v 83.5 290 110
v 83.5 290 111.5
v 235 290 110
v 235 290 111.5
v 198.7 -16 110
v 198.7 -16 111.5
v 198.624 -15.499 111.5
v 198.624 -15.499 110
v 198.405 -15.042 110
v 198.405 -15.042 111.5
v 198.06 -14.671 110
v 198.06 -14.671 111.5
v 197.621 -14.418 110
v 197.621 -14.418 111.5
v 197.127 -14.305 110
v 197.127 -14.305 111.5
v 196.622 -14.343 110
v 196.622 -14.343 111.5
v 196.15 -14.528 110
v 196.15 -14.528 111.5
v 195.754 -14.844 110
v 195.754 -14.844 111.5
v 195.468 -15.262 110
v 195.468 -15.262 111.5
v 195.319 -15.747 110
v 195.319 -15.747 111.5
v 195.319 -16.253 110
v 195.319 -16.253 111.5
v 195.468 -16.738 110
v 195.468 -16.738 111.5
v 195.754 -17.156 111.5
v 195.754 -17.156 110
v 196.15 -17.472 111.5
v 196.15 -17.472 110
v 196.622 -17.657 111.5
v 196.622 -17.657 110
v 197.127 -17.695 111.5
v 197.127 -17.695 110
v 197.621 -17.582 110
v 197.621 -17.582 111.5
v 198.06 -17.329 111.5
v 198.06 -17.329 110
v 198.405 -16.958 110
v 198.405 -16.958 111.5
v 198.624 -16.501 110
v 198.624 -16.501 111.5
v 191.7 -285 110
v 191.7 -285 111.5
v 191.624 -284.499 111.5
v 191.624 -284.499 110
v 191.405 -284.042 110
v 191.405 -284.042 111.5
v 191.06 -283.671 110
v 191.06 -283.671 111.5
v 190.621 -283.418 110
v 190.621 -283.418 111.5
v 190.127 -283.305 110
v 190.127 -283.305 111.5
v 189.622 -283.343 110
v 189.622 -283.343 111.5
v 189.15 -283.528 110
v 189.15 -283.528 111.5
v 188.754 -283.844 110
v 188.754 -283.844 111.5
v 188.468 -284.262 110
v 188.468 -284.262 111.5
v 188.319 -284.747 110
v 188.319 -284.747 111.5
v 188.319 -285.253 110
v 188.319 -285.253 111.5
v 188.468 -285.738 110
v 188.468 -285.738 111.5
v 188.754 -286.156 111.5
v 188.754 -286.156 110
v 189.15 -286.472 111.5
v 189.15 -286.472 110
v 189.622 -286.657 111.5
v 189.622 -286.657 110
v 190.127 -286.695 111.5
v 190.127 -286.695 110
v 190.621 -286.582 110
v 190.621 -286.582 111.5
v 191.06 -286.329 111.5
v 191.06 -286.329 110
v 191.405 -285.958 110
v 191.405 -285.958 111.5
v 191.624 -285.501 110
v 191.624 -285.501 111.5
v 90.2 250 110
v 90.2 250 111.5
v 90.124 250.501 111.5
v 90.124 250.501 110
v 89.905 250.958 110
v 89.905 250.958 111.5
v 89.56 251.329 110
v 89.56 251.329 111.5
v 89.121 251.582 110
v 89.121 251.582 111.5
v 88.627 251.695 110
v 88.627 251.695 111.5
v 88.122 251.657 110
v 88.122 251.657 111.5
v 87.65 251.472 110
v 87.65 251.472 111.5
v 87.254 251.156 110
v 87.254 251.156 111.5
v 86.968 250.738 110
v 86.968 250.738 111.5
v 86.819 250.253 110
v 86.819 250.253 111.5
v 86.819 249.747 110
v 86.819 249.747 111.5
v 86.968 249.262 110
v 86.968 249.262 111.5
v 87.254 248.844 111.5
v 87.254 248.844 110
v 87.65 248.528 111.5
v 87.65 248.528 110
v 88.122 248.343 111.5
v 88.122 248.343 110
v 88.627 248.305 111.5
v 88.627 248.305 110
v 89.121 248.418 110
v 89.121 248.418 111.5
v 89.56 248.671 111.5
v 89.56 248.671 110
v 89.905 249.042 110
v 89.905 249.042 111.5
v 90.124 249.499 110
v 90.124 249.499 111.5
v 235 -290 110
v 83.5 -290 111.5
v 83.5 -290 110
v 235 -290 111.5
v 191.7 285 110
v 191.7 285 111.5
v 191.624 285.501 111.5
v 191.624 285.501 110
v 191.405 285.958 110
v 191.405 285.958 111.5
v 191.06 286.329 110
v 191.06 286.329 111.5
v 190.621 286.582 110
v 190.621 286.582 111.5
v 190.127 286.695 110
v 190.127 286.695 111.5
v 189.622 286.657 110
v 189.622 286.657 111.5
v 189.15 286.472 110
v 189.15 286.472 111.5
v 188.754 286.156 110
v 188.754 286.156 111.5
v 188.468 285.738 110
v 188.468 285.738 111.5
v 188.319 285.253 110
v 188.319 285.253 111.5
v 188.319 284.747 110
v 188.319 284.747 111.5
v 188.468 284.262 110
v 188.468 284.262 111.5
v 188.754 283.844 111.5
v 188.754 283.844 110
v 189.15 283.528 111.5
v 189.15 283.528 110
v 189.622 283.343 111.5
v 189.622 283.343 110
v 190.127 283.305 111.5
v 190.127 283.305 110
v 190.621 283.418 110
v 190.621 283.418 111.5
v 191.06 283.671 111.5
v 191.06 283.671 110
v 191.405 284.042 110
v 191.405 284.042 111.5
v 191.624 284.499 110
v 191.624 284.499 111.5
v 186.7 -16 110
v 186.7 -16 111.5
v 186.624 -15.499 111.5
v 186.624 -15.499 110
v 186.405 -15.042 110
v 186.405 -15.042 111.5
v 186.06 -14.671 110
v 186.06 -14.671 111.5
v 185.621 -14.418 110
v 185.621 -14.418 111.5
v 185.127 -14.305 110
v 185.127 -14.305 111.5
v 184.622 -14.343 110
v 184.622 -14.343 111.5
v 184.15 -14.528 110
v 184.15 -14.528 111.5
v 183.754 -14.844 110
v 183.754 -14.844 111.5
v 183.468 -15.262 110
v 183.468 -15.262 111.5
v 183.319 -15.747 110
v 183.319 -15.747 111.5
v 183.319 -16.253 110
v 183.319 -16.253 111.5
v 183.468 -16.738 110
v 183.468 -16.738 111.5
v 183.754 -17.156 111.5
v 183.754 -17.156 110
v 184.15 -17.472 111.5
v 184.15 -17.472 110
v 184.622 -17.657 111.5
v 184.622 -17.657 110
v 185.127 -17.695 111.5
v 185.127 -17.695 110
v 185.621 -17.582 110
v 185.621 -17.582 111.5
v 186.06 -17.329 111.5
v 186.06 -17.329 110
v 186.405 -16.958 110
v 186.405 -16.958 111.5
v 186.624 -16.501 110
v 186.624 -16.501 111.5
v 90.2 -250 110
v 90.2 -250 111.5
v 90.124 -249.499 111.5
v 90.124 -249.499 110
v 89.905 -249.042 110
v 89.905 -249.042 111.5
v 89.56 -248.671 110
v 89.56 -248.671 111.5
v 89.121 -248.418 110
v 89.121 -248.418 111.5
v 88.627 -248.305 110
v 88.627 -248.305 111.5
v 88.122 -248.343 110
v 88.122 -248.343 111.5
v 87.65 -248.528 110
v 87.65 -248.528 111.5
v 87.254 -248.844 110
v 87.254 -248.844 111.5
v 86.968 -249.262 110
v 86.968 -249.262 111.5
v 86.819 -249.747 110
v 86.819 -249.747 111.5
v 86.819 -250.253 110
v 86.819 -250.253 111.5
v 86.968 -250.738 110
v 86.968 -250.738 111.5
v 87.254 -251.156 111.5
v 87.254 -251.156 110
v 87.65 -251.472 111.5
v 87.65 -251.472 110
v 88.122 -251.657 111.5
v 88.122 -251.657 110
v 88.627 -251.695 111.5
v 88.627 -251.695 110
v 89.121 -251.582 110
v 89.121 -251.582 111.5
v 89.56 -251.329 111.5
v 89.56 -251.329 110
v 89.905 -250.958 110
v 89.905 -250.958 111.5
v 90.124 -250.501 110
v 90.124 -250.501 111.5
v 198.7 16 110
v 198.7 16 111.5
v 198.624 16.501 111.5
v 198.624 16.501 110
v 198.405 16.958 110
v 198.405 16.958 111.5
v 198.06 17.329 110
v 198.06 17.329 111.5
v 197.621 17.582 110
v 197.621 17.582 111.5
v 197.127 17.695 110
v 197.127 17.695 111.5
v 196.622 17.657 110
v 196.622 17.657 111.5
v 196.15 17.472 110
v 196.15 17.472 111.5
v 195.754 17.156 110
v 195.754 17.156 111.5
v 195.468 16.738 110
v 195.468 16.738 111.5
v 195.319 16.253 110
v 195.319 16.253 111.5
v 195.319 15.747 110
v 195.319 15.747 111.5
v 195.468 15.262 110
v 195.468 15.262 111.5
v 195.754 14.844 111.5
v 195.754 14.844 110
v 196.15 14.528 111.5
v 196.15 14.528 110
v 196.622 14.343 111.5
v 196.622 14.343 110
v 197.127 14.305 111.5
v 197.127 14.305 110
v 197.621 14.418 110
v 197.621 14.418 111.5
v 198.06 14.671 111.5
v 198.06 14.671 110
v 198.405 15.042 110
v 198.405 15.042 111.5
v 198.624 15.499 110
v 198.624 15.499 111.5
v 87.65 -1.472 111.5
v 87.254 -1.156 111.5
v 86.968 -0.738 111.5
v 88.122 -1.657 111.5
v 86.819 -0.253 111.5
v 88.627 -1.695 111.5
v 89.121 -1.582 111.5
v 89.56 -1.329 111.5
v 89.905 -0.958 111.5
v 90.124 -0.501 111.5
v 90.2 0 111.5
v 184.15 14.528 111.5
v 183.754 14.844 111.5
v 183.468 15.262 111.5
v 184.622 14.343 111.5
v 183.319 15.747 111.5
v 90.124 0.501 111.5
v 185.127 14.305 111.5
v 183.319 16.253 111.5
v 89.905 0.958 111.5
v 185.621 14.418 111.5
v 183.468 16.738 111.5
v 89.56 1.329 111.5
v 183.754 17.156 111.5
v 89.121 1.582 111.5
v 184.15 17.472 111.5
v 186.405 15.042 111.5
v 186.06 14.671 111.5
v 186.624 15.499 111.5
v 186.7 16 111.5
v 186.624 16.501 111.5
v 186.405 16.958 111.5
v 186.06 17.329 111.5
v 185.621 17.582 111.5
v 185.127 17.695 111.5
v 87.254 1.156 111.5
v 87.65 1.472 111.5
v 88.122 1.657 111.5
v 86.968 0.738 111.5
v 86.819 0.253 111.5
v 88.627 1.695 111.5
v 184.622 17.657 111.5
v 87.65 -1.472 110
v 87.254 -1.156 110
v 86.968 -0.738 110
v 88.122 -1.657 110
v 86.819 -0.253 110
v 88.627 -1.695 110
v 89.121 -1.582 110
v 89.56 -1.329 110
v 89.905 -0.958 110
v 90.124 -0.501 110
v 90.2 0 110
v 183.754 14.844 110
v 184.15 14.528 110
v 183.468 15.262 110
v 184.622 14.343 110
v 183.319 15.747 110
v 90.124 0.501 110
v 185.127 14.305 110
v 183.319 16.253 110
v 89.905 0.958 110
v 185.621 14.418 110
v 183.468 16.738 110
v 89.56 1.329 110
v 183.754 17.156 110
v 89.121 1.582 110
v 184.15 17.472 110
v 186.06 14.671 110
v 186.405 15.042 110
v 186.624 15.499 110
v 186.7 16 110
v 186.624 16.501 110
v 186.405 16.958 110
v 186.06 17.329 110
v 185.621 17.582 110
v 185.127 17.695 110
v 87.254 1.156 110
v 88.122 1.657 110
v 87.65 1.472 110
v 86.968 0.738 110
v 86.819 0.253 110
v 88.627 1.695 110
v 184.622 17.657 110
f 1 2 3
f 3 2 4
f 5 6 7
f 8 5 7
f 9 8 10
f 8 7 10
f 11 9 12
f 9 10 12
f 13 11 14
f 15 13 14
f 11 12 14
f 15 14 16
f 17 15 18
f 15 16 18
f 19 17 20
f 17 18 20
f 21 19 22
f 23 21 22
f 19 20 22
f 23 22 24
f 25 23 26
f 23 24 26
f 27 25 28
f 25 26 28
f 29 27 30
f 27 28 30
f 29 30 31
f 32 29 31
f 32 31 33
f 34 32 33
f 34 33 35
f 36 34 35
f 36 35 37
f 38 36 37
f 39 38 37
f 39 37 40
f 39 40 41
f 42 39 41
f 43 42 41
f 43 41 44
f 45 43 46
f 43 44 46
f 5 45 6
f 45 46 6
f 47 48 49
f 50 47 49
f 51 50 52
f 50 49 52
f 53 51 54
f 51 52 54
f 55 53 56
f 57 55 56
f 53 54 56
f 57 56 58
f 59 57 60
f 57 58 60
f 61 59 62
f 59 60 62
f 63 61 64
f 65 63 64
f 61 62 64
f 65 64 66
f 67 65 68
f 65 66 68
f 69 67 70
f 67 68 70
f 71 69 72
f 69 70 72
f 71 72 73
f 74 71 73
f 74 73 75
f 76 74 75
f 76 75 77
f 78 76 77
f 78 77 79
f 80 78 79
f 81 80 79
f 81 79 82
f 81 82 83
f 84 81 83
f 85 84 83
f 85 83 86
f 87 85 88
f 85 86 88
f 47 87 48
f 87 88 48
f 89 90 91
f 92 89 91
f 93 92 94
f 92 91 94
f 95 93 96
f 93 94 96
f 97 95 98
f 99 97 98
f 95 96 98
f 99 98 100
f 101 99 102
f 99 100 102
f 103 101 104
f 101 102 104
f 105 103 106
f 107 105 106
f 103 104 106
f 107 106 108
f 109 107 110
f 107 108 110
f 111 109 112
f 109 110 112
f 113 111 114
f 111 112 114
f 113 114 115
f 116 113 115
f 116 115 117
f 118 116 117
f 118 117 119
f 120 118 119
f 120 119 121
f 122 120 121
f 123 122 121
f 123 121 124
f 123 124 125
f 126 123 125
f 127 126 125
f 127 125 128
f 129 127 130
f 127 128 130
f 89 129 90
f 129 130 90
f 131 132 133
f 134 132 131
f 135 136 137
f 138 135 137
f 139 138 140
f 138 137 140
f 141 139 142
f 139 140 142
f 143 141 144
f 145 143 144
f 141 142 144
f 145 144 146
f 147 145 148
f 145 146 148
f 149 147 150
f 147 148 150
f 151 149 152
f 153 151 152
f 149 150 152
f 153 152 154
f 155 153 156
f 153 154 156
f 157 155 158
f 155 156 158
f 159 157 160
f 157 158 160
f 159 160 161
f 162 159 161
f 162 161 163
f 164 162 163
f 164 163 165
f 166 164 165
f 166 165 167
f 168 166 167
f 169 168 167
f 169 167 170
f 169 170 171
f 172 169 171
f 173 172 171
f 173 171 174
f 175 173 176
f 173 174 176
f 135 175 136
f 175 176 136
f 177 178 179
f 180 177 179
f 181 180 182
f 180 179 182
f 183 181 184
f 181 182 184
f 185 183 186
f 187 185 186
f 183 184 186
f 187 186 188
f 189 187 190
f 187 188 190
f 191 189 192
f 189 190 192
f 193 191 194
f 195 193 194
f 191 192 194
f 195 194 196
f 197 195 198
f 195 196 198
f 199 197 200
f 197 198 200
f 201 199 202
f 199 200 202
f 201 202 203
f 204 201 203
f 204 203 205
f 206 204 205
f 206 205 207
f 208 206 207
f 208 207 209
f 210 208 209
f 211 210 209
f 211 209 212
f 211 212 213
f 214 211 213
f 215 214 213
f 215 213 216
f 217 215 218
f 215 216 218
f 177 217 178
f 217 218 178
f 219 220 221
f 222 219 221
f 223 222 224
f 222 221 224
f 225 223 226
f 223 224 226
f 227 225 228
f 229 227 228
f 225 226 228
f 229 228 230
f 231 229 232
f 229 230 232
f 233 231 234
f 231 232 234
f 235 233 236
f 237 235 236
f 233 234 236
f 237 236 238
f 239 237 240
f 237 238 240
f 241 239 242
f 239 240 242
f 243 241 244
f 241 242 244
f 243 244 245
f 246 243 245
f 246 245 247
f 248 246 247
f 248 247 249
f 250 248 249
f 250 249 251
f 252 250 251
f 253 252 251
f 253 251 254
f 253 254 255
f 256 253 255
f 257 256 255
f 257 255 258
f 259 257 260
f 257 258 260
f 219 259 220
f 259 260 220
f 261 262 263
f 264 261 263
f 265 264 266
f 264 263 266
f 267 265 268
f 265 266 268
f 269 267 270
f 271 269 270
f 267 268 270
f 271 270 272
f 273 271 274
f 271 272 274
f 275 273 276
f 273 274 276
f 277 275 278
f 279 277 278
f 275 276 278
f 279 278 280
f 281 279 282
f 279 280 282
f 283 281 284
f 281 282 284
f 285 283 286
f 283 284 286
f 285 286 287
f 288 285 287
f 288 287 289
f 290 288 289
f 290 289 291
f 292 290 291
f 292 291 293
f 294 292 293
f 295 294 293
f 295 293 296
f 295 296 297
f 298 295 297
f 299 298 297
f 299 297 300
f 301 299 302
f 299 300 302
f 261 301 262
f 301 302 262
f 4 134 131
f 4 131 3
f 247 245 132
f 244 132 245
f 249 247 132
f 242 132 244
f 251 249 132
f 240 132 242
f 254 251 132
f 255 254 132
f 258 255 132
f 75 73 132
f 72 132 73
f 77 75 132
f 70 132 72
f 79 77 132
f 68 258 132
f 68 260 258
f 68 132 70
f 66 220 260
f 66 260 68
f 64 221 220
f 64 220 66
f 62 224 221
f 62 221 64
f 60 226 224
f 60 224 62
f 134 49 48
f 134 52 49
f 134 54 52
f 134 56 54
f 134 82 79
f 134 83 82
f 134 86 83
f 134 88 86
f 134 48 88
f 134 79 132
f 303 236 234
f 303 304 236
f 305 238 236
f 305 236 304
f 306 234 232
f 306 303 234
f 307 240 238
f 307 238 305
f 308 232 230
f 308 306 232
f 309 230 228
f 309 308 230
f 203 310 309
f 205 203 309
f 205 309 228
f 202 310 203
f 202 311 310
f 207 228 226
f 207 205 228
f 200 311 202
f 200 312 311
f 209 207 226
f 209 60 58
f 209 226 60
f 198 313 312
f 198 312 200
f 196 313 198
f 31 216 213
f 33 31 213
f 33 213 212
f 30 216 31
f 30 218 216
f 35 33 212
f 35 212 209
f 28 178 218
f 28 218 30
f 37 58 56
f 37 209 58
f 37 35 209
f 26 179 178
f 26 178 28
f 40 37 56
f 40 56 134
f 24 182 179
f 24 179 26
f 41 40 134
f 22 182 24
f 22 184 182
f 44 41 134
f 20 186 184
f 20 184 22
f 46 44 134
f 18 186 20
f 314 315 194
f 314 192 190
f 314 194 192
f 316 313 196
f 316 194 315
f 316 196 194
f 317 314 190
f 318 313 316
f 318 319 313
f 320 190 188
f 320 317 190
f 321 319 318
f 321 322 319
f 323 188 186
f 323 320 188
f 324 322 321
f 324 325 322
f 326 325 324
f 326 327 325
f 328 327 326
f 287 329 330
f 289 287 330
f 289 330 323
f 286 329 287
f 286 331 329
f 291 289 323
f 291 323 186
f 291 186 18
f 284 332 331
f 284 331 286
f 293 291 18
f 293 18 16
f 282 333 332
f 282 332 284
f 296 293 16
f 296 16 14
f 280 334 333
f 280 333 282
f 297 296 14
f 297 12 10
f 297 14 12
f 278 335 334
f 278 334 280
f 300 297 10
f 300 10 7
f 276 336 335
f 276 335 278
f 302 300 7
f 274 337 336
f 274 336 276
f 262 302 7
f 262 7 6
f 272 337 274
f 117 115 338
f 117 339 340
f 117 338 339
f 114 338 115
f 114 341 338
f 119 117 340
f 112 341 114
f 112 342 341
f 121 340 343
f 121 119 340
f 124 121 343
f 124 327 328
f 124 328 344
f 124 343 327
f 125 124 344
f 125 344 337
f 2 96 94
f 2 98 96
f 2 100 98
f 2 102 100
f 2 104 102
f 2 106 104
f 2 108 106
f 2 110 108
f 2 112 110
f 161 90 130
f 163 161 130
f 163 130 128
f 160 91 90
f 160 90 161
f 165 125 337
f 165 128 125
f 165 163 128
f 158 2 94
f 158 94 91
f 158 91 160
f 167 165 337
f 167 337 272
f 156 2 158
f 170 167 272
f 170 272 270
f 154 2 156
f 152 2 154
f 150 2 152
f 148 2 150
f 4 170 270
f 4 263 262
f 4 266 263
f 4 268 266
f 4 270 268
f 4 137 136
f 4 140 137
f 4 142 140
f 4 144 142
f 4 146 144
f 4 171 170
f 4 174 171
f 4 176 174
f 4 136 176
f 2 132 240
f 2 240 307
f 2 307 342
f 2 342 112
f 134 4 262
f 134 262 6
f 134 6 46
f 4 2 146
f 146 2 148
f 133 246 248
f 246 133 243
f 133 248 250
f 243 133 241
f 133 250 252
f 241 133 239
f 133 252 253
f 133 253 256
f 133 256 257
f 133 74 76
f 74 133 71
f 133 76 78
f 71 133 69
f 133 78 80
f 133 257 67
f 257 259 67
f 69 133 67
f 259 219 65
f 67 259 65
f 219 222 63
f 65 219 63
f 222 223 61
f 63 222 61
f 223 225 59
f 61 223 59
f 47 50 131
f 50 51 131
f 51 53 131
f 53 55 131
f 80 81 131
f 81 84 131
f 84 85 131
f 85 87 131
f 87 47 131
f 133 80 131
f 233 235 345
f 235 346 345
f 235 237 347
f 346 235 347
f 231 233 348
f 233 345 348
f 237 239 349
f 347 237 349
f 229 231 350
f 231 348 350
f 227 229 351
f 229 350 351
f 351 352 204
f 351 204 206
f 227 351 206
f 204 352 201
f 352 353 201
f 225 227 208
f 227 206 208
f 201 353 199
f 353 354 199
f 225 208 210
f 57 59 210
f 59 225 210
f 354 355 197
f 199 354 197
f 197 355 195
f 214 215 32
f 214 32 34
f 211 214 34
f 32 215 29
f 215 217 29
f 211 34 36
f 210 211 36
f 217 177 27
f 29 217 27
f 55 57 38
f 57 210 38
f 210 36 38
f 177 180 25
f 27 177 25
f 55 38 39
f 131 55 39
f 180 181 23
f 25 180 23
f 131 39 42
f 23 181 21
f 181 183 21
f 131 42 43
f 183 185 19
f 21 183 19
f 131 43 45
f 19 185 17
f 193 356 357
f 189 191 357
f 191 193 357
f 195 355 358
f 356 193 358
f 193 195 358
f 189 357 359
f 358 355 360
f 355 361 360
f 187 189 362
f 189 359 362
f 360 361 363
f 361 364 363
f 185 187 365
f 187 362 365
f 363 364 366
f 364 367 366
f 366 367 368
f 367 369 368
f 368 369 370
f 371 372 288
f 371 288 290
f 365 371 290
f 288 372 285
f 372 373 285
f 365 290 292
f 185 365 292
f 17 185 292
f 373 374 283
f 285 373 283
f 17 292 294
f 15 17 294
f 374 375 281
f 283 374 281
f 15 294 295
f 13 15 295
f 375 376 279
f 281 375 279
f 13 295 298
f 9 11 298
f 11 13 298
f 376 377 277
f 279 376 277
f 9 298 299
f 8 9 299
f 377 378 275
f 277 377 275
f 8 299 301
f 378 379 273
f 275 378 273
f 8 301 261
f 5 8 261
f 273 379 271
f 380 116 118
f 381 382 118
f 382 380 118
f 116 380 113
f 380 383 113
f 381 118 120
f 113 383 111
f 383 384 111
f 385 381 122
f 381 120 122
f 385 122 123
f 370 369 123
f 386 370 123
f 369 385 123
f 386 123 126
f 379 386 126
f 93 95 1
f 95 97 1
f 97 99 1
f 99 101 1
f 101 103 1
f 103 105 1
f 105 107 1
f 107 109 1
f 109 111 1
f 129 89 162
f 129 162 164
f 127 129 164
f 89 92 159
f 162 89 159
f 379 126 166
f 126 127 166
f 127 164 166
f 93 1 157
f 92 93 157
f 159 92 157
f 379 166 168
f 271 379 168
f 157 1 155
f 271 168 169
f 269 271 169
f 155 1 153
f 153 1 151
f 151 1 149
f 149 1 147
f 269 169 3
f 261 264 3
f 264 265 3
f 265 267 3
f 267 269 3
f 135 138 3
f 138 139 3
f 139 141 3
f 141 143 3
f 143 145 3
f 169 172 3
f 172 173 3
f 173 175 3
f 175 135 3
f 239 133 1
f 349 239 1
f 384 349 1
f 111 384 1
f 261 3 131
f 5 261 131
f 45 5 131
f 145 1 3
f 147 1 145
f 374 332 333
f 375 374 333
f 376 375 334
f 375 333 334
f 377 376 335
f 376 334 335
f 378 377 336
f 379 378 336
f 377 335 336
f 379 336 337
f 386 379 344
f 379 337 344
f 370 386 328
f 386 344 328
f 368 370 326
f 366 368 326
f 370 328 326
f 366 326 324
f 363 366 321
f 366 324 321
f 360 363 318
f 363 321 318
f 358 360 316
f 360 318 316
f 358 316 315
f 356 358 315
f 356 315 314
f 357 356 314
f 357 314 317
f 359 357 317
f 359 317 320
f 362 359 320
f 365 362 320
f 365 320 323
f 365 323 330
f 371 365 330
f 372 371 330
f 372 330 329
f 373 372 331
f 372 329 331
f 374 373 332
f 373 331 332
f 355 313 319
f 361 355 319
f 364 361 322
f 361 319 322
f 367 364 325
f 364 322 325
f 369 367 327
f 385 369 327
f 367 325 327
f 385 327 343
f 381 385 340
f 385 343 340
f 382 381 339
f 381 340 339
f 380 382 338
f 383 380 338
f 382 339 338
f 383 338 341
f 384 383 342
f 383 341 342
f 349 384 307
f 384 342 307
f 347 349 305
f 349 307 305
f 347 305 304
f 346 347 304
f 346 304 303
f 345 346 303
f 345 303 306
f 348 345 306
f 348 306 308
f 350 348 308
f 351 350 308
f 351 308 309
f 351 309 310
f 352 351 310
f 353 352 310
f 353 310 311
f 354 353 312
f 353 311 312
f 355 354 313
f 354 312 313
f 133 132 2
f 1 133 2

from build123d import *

# Parameters (mm, degrees)
MAIN_PROFILE_SKETCH_W = 151.5
MAIN_PROFILE_SKETCH_H = 580
MAIN_PROFILE_SKETCH_R = 1.7
MAIN_EXTRUSION_DEPTH  = 1.5


with BuildPart() as part:
    # Main Profile Sketch → Main Extrusion (new body)
    with BuildSketch(Plane.XY.offset(111.5)):
        with Locations((159.25, 0)):
            Rectangle(MAIN_PROFILE_SKETCH_W, MAIN_PROFILE_SKETCH_H)
        with Locations((88.5, -250)):
            Circle(MAIN_PROFILE_SKETCH_R, mode=Mode.SUBTRACT)
        with Locations((190, -285)):
            Circle(MAIN_PROFILE_SKETCH_R, mode=Mode.SUBTRACT)
        with Locations((185, -16)):
            Circle(MAIN_PROFILE_SKETCH_R, mode=Mode.SUBTRACT)
        with Locations((197, -16)):
            Circle(MAIN_PROFILE_SKETCH_R, mode=Mode.SUBTRACT)
        with Locations((88.5, 0)):
            Circle(MAIN_PROFILE_SKETCH_R, mode=Mode.SUBTRACT)
        with Locations((88.5, 250)):
            Circle(MAIN_PROFILE_SKETCH_R, mode=Mode.SUBTRACT)
        with Locations((185, 16)):
            Circle(MAIN_PROFILE_SKETCH_R, mode=Mode.SUBTRACT)
        with Locations((197, 16)):
            Circle(MAIN_PROFILE_SKETCH_R, mode=Mode.SUBTRACT)
        with Locations((190, 285)):
            Circle(MAIN_PROFILE_SKETCH_R, mode=Mode.SUBTRACT)
    extrude(amount=-MAIN_EXTRUSION_DEPTH)


solid = part.part
